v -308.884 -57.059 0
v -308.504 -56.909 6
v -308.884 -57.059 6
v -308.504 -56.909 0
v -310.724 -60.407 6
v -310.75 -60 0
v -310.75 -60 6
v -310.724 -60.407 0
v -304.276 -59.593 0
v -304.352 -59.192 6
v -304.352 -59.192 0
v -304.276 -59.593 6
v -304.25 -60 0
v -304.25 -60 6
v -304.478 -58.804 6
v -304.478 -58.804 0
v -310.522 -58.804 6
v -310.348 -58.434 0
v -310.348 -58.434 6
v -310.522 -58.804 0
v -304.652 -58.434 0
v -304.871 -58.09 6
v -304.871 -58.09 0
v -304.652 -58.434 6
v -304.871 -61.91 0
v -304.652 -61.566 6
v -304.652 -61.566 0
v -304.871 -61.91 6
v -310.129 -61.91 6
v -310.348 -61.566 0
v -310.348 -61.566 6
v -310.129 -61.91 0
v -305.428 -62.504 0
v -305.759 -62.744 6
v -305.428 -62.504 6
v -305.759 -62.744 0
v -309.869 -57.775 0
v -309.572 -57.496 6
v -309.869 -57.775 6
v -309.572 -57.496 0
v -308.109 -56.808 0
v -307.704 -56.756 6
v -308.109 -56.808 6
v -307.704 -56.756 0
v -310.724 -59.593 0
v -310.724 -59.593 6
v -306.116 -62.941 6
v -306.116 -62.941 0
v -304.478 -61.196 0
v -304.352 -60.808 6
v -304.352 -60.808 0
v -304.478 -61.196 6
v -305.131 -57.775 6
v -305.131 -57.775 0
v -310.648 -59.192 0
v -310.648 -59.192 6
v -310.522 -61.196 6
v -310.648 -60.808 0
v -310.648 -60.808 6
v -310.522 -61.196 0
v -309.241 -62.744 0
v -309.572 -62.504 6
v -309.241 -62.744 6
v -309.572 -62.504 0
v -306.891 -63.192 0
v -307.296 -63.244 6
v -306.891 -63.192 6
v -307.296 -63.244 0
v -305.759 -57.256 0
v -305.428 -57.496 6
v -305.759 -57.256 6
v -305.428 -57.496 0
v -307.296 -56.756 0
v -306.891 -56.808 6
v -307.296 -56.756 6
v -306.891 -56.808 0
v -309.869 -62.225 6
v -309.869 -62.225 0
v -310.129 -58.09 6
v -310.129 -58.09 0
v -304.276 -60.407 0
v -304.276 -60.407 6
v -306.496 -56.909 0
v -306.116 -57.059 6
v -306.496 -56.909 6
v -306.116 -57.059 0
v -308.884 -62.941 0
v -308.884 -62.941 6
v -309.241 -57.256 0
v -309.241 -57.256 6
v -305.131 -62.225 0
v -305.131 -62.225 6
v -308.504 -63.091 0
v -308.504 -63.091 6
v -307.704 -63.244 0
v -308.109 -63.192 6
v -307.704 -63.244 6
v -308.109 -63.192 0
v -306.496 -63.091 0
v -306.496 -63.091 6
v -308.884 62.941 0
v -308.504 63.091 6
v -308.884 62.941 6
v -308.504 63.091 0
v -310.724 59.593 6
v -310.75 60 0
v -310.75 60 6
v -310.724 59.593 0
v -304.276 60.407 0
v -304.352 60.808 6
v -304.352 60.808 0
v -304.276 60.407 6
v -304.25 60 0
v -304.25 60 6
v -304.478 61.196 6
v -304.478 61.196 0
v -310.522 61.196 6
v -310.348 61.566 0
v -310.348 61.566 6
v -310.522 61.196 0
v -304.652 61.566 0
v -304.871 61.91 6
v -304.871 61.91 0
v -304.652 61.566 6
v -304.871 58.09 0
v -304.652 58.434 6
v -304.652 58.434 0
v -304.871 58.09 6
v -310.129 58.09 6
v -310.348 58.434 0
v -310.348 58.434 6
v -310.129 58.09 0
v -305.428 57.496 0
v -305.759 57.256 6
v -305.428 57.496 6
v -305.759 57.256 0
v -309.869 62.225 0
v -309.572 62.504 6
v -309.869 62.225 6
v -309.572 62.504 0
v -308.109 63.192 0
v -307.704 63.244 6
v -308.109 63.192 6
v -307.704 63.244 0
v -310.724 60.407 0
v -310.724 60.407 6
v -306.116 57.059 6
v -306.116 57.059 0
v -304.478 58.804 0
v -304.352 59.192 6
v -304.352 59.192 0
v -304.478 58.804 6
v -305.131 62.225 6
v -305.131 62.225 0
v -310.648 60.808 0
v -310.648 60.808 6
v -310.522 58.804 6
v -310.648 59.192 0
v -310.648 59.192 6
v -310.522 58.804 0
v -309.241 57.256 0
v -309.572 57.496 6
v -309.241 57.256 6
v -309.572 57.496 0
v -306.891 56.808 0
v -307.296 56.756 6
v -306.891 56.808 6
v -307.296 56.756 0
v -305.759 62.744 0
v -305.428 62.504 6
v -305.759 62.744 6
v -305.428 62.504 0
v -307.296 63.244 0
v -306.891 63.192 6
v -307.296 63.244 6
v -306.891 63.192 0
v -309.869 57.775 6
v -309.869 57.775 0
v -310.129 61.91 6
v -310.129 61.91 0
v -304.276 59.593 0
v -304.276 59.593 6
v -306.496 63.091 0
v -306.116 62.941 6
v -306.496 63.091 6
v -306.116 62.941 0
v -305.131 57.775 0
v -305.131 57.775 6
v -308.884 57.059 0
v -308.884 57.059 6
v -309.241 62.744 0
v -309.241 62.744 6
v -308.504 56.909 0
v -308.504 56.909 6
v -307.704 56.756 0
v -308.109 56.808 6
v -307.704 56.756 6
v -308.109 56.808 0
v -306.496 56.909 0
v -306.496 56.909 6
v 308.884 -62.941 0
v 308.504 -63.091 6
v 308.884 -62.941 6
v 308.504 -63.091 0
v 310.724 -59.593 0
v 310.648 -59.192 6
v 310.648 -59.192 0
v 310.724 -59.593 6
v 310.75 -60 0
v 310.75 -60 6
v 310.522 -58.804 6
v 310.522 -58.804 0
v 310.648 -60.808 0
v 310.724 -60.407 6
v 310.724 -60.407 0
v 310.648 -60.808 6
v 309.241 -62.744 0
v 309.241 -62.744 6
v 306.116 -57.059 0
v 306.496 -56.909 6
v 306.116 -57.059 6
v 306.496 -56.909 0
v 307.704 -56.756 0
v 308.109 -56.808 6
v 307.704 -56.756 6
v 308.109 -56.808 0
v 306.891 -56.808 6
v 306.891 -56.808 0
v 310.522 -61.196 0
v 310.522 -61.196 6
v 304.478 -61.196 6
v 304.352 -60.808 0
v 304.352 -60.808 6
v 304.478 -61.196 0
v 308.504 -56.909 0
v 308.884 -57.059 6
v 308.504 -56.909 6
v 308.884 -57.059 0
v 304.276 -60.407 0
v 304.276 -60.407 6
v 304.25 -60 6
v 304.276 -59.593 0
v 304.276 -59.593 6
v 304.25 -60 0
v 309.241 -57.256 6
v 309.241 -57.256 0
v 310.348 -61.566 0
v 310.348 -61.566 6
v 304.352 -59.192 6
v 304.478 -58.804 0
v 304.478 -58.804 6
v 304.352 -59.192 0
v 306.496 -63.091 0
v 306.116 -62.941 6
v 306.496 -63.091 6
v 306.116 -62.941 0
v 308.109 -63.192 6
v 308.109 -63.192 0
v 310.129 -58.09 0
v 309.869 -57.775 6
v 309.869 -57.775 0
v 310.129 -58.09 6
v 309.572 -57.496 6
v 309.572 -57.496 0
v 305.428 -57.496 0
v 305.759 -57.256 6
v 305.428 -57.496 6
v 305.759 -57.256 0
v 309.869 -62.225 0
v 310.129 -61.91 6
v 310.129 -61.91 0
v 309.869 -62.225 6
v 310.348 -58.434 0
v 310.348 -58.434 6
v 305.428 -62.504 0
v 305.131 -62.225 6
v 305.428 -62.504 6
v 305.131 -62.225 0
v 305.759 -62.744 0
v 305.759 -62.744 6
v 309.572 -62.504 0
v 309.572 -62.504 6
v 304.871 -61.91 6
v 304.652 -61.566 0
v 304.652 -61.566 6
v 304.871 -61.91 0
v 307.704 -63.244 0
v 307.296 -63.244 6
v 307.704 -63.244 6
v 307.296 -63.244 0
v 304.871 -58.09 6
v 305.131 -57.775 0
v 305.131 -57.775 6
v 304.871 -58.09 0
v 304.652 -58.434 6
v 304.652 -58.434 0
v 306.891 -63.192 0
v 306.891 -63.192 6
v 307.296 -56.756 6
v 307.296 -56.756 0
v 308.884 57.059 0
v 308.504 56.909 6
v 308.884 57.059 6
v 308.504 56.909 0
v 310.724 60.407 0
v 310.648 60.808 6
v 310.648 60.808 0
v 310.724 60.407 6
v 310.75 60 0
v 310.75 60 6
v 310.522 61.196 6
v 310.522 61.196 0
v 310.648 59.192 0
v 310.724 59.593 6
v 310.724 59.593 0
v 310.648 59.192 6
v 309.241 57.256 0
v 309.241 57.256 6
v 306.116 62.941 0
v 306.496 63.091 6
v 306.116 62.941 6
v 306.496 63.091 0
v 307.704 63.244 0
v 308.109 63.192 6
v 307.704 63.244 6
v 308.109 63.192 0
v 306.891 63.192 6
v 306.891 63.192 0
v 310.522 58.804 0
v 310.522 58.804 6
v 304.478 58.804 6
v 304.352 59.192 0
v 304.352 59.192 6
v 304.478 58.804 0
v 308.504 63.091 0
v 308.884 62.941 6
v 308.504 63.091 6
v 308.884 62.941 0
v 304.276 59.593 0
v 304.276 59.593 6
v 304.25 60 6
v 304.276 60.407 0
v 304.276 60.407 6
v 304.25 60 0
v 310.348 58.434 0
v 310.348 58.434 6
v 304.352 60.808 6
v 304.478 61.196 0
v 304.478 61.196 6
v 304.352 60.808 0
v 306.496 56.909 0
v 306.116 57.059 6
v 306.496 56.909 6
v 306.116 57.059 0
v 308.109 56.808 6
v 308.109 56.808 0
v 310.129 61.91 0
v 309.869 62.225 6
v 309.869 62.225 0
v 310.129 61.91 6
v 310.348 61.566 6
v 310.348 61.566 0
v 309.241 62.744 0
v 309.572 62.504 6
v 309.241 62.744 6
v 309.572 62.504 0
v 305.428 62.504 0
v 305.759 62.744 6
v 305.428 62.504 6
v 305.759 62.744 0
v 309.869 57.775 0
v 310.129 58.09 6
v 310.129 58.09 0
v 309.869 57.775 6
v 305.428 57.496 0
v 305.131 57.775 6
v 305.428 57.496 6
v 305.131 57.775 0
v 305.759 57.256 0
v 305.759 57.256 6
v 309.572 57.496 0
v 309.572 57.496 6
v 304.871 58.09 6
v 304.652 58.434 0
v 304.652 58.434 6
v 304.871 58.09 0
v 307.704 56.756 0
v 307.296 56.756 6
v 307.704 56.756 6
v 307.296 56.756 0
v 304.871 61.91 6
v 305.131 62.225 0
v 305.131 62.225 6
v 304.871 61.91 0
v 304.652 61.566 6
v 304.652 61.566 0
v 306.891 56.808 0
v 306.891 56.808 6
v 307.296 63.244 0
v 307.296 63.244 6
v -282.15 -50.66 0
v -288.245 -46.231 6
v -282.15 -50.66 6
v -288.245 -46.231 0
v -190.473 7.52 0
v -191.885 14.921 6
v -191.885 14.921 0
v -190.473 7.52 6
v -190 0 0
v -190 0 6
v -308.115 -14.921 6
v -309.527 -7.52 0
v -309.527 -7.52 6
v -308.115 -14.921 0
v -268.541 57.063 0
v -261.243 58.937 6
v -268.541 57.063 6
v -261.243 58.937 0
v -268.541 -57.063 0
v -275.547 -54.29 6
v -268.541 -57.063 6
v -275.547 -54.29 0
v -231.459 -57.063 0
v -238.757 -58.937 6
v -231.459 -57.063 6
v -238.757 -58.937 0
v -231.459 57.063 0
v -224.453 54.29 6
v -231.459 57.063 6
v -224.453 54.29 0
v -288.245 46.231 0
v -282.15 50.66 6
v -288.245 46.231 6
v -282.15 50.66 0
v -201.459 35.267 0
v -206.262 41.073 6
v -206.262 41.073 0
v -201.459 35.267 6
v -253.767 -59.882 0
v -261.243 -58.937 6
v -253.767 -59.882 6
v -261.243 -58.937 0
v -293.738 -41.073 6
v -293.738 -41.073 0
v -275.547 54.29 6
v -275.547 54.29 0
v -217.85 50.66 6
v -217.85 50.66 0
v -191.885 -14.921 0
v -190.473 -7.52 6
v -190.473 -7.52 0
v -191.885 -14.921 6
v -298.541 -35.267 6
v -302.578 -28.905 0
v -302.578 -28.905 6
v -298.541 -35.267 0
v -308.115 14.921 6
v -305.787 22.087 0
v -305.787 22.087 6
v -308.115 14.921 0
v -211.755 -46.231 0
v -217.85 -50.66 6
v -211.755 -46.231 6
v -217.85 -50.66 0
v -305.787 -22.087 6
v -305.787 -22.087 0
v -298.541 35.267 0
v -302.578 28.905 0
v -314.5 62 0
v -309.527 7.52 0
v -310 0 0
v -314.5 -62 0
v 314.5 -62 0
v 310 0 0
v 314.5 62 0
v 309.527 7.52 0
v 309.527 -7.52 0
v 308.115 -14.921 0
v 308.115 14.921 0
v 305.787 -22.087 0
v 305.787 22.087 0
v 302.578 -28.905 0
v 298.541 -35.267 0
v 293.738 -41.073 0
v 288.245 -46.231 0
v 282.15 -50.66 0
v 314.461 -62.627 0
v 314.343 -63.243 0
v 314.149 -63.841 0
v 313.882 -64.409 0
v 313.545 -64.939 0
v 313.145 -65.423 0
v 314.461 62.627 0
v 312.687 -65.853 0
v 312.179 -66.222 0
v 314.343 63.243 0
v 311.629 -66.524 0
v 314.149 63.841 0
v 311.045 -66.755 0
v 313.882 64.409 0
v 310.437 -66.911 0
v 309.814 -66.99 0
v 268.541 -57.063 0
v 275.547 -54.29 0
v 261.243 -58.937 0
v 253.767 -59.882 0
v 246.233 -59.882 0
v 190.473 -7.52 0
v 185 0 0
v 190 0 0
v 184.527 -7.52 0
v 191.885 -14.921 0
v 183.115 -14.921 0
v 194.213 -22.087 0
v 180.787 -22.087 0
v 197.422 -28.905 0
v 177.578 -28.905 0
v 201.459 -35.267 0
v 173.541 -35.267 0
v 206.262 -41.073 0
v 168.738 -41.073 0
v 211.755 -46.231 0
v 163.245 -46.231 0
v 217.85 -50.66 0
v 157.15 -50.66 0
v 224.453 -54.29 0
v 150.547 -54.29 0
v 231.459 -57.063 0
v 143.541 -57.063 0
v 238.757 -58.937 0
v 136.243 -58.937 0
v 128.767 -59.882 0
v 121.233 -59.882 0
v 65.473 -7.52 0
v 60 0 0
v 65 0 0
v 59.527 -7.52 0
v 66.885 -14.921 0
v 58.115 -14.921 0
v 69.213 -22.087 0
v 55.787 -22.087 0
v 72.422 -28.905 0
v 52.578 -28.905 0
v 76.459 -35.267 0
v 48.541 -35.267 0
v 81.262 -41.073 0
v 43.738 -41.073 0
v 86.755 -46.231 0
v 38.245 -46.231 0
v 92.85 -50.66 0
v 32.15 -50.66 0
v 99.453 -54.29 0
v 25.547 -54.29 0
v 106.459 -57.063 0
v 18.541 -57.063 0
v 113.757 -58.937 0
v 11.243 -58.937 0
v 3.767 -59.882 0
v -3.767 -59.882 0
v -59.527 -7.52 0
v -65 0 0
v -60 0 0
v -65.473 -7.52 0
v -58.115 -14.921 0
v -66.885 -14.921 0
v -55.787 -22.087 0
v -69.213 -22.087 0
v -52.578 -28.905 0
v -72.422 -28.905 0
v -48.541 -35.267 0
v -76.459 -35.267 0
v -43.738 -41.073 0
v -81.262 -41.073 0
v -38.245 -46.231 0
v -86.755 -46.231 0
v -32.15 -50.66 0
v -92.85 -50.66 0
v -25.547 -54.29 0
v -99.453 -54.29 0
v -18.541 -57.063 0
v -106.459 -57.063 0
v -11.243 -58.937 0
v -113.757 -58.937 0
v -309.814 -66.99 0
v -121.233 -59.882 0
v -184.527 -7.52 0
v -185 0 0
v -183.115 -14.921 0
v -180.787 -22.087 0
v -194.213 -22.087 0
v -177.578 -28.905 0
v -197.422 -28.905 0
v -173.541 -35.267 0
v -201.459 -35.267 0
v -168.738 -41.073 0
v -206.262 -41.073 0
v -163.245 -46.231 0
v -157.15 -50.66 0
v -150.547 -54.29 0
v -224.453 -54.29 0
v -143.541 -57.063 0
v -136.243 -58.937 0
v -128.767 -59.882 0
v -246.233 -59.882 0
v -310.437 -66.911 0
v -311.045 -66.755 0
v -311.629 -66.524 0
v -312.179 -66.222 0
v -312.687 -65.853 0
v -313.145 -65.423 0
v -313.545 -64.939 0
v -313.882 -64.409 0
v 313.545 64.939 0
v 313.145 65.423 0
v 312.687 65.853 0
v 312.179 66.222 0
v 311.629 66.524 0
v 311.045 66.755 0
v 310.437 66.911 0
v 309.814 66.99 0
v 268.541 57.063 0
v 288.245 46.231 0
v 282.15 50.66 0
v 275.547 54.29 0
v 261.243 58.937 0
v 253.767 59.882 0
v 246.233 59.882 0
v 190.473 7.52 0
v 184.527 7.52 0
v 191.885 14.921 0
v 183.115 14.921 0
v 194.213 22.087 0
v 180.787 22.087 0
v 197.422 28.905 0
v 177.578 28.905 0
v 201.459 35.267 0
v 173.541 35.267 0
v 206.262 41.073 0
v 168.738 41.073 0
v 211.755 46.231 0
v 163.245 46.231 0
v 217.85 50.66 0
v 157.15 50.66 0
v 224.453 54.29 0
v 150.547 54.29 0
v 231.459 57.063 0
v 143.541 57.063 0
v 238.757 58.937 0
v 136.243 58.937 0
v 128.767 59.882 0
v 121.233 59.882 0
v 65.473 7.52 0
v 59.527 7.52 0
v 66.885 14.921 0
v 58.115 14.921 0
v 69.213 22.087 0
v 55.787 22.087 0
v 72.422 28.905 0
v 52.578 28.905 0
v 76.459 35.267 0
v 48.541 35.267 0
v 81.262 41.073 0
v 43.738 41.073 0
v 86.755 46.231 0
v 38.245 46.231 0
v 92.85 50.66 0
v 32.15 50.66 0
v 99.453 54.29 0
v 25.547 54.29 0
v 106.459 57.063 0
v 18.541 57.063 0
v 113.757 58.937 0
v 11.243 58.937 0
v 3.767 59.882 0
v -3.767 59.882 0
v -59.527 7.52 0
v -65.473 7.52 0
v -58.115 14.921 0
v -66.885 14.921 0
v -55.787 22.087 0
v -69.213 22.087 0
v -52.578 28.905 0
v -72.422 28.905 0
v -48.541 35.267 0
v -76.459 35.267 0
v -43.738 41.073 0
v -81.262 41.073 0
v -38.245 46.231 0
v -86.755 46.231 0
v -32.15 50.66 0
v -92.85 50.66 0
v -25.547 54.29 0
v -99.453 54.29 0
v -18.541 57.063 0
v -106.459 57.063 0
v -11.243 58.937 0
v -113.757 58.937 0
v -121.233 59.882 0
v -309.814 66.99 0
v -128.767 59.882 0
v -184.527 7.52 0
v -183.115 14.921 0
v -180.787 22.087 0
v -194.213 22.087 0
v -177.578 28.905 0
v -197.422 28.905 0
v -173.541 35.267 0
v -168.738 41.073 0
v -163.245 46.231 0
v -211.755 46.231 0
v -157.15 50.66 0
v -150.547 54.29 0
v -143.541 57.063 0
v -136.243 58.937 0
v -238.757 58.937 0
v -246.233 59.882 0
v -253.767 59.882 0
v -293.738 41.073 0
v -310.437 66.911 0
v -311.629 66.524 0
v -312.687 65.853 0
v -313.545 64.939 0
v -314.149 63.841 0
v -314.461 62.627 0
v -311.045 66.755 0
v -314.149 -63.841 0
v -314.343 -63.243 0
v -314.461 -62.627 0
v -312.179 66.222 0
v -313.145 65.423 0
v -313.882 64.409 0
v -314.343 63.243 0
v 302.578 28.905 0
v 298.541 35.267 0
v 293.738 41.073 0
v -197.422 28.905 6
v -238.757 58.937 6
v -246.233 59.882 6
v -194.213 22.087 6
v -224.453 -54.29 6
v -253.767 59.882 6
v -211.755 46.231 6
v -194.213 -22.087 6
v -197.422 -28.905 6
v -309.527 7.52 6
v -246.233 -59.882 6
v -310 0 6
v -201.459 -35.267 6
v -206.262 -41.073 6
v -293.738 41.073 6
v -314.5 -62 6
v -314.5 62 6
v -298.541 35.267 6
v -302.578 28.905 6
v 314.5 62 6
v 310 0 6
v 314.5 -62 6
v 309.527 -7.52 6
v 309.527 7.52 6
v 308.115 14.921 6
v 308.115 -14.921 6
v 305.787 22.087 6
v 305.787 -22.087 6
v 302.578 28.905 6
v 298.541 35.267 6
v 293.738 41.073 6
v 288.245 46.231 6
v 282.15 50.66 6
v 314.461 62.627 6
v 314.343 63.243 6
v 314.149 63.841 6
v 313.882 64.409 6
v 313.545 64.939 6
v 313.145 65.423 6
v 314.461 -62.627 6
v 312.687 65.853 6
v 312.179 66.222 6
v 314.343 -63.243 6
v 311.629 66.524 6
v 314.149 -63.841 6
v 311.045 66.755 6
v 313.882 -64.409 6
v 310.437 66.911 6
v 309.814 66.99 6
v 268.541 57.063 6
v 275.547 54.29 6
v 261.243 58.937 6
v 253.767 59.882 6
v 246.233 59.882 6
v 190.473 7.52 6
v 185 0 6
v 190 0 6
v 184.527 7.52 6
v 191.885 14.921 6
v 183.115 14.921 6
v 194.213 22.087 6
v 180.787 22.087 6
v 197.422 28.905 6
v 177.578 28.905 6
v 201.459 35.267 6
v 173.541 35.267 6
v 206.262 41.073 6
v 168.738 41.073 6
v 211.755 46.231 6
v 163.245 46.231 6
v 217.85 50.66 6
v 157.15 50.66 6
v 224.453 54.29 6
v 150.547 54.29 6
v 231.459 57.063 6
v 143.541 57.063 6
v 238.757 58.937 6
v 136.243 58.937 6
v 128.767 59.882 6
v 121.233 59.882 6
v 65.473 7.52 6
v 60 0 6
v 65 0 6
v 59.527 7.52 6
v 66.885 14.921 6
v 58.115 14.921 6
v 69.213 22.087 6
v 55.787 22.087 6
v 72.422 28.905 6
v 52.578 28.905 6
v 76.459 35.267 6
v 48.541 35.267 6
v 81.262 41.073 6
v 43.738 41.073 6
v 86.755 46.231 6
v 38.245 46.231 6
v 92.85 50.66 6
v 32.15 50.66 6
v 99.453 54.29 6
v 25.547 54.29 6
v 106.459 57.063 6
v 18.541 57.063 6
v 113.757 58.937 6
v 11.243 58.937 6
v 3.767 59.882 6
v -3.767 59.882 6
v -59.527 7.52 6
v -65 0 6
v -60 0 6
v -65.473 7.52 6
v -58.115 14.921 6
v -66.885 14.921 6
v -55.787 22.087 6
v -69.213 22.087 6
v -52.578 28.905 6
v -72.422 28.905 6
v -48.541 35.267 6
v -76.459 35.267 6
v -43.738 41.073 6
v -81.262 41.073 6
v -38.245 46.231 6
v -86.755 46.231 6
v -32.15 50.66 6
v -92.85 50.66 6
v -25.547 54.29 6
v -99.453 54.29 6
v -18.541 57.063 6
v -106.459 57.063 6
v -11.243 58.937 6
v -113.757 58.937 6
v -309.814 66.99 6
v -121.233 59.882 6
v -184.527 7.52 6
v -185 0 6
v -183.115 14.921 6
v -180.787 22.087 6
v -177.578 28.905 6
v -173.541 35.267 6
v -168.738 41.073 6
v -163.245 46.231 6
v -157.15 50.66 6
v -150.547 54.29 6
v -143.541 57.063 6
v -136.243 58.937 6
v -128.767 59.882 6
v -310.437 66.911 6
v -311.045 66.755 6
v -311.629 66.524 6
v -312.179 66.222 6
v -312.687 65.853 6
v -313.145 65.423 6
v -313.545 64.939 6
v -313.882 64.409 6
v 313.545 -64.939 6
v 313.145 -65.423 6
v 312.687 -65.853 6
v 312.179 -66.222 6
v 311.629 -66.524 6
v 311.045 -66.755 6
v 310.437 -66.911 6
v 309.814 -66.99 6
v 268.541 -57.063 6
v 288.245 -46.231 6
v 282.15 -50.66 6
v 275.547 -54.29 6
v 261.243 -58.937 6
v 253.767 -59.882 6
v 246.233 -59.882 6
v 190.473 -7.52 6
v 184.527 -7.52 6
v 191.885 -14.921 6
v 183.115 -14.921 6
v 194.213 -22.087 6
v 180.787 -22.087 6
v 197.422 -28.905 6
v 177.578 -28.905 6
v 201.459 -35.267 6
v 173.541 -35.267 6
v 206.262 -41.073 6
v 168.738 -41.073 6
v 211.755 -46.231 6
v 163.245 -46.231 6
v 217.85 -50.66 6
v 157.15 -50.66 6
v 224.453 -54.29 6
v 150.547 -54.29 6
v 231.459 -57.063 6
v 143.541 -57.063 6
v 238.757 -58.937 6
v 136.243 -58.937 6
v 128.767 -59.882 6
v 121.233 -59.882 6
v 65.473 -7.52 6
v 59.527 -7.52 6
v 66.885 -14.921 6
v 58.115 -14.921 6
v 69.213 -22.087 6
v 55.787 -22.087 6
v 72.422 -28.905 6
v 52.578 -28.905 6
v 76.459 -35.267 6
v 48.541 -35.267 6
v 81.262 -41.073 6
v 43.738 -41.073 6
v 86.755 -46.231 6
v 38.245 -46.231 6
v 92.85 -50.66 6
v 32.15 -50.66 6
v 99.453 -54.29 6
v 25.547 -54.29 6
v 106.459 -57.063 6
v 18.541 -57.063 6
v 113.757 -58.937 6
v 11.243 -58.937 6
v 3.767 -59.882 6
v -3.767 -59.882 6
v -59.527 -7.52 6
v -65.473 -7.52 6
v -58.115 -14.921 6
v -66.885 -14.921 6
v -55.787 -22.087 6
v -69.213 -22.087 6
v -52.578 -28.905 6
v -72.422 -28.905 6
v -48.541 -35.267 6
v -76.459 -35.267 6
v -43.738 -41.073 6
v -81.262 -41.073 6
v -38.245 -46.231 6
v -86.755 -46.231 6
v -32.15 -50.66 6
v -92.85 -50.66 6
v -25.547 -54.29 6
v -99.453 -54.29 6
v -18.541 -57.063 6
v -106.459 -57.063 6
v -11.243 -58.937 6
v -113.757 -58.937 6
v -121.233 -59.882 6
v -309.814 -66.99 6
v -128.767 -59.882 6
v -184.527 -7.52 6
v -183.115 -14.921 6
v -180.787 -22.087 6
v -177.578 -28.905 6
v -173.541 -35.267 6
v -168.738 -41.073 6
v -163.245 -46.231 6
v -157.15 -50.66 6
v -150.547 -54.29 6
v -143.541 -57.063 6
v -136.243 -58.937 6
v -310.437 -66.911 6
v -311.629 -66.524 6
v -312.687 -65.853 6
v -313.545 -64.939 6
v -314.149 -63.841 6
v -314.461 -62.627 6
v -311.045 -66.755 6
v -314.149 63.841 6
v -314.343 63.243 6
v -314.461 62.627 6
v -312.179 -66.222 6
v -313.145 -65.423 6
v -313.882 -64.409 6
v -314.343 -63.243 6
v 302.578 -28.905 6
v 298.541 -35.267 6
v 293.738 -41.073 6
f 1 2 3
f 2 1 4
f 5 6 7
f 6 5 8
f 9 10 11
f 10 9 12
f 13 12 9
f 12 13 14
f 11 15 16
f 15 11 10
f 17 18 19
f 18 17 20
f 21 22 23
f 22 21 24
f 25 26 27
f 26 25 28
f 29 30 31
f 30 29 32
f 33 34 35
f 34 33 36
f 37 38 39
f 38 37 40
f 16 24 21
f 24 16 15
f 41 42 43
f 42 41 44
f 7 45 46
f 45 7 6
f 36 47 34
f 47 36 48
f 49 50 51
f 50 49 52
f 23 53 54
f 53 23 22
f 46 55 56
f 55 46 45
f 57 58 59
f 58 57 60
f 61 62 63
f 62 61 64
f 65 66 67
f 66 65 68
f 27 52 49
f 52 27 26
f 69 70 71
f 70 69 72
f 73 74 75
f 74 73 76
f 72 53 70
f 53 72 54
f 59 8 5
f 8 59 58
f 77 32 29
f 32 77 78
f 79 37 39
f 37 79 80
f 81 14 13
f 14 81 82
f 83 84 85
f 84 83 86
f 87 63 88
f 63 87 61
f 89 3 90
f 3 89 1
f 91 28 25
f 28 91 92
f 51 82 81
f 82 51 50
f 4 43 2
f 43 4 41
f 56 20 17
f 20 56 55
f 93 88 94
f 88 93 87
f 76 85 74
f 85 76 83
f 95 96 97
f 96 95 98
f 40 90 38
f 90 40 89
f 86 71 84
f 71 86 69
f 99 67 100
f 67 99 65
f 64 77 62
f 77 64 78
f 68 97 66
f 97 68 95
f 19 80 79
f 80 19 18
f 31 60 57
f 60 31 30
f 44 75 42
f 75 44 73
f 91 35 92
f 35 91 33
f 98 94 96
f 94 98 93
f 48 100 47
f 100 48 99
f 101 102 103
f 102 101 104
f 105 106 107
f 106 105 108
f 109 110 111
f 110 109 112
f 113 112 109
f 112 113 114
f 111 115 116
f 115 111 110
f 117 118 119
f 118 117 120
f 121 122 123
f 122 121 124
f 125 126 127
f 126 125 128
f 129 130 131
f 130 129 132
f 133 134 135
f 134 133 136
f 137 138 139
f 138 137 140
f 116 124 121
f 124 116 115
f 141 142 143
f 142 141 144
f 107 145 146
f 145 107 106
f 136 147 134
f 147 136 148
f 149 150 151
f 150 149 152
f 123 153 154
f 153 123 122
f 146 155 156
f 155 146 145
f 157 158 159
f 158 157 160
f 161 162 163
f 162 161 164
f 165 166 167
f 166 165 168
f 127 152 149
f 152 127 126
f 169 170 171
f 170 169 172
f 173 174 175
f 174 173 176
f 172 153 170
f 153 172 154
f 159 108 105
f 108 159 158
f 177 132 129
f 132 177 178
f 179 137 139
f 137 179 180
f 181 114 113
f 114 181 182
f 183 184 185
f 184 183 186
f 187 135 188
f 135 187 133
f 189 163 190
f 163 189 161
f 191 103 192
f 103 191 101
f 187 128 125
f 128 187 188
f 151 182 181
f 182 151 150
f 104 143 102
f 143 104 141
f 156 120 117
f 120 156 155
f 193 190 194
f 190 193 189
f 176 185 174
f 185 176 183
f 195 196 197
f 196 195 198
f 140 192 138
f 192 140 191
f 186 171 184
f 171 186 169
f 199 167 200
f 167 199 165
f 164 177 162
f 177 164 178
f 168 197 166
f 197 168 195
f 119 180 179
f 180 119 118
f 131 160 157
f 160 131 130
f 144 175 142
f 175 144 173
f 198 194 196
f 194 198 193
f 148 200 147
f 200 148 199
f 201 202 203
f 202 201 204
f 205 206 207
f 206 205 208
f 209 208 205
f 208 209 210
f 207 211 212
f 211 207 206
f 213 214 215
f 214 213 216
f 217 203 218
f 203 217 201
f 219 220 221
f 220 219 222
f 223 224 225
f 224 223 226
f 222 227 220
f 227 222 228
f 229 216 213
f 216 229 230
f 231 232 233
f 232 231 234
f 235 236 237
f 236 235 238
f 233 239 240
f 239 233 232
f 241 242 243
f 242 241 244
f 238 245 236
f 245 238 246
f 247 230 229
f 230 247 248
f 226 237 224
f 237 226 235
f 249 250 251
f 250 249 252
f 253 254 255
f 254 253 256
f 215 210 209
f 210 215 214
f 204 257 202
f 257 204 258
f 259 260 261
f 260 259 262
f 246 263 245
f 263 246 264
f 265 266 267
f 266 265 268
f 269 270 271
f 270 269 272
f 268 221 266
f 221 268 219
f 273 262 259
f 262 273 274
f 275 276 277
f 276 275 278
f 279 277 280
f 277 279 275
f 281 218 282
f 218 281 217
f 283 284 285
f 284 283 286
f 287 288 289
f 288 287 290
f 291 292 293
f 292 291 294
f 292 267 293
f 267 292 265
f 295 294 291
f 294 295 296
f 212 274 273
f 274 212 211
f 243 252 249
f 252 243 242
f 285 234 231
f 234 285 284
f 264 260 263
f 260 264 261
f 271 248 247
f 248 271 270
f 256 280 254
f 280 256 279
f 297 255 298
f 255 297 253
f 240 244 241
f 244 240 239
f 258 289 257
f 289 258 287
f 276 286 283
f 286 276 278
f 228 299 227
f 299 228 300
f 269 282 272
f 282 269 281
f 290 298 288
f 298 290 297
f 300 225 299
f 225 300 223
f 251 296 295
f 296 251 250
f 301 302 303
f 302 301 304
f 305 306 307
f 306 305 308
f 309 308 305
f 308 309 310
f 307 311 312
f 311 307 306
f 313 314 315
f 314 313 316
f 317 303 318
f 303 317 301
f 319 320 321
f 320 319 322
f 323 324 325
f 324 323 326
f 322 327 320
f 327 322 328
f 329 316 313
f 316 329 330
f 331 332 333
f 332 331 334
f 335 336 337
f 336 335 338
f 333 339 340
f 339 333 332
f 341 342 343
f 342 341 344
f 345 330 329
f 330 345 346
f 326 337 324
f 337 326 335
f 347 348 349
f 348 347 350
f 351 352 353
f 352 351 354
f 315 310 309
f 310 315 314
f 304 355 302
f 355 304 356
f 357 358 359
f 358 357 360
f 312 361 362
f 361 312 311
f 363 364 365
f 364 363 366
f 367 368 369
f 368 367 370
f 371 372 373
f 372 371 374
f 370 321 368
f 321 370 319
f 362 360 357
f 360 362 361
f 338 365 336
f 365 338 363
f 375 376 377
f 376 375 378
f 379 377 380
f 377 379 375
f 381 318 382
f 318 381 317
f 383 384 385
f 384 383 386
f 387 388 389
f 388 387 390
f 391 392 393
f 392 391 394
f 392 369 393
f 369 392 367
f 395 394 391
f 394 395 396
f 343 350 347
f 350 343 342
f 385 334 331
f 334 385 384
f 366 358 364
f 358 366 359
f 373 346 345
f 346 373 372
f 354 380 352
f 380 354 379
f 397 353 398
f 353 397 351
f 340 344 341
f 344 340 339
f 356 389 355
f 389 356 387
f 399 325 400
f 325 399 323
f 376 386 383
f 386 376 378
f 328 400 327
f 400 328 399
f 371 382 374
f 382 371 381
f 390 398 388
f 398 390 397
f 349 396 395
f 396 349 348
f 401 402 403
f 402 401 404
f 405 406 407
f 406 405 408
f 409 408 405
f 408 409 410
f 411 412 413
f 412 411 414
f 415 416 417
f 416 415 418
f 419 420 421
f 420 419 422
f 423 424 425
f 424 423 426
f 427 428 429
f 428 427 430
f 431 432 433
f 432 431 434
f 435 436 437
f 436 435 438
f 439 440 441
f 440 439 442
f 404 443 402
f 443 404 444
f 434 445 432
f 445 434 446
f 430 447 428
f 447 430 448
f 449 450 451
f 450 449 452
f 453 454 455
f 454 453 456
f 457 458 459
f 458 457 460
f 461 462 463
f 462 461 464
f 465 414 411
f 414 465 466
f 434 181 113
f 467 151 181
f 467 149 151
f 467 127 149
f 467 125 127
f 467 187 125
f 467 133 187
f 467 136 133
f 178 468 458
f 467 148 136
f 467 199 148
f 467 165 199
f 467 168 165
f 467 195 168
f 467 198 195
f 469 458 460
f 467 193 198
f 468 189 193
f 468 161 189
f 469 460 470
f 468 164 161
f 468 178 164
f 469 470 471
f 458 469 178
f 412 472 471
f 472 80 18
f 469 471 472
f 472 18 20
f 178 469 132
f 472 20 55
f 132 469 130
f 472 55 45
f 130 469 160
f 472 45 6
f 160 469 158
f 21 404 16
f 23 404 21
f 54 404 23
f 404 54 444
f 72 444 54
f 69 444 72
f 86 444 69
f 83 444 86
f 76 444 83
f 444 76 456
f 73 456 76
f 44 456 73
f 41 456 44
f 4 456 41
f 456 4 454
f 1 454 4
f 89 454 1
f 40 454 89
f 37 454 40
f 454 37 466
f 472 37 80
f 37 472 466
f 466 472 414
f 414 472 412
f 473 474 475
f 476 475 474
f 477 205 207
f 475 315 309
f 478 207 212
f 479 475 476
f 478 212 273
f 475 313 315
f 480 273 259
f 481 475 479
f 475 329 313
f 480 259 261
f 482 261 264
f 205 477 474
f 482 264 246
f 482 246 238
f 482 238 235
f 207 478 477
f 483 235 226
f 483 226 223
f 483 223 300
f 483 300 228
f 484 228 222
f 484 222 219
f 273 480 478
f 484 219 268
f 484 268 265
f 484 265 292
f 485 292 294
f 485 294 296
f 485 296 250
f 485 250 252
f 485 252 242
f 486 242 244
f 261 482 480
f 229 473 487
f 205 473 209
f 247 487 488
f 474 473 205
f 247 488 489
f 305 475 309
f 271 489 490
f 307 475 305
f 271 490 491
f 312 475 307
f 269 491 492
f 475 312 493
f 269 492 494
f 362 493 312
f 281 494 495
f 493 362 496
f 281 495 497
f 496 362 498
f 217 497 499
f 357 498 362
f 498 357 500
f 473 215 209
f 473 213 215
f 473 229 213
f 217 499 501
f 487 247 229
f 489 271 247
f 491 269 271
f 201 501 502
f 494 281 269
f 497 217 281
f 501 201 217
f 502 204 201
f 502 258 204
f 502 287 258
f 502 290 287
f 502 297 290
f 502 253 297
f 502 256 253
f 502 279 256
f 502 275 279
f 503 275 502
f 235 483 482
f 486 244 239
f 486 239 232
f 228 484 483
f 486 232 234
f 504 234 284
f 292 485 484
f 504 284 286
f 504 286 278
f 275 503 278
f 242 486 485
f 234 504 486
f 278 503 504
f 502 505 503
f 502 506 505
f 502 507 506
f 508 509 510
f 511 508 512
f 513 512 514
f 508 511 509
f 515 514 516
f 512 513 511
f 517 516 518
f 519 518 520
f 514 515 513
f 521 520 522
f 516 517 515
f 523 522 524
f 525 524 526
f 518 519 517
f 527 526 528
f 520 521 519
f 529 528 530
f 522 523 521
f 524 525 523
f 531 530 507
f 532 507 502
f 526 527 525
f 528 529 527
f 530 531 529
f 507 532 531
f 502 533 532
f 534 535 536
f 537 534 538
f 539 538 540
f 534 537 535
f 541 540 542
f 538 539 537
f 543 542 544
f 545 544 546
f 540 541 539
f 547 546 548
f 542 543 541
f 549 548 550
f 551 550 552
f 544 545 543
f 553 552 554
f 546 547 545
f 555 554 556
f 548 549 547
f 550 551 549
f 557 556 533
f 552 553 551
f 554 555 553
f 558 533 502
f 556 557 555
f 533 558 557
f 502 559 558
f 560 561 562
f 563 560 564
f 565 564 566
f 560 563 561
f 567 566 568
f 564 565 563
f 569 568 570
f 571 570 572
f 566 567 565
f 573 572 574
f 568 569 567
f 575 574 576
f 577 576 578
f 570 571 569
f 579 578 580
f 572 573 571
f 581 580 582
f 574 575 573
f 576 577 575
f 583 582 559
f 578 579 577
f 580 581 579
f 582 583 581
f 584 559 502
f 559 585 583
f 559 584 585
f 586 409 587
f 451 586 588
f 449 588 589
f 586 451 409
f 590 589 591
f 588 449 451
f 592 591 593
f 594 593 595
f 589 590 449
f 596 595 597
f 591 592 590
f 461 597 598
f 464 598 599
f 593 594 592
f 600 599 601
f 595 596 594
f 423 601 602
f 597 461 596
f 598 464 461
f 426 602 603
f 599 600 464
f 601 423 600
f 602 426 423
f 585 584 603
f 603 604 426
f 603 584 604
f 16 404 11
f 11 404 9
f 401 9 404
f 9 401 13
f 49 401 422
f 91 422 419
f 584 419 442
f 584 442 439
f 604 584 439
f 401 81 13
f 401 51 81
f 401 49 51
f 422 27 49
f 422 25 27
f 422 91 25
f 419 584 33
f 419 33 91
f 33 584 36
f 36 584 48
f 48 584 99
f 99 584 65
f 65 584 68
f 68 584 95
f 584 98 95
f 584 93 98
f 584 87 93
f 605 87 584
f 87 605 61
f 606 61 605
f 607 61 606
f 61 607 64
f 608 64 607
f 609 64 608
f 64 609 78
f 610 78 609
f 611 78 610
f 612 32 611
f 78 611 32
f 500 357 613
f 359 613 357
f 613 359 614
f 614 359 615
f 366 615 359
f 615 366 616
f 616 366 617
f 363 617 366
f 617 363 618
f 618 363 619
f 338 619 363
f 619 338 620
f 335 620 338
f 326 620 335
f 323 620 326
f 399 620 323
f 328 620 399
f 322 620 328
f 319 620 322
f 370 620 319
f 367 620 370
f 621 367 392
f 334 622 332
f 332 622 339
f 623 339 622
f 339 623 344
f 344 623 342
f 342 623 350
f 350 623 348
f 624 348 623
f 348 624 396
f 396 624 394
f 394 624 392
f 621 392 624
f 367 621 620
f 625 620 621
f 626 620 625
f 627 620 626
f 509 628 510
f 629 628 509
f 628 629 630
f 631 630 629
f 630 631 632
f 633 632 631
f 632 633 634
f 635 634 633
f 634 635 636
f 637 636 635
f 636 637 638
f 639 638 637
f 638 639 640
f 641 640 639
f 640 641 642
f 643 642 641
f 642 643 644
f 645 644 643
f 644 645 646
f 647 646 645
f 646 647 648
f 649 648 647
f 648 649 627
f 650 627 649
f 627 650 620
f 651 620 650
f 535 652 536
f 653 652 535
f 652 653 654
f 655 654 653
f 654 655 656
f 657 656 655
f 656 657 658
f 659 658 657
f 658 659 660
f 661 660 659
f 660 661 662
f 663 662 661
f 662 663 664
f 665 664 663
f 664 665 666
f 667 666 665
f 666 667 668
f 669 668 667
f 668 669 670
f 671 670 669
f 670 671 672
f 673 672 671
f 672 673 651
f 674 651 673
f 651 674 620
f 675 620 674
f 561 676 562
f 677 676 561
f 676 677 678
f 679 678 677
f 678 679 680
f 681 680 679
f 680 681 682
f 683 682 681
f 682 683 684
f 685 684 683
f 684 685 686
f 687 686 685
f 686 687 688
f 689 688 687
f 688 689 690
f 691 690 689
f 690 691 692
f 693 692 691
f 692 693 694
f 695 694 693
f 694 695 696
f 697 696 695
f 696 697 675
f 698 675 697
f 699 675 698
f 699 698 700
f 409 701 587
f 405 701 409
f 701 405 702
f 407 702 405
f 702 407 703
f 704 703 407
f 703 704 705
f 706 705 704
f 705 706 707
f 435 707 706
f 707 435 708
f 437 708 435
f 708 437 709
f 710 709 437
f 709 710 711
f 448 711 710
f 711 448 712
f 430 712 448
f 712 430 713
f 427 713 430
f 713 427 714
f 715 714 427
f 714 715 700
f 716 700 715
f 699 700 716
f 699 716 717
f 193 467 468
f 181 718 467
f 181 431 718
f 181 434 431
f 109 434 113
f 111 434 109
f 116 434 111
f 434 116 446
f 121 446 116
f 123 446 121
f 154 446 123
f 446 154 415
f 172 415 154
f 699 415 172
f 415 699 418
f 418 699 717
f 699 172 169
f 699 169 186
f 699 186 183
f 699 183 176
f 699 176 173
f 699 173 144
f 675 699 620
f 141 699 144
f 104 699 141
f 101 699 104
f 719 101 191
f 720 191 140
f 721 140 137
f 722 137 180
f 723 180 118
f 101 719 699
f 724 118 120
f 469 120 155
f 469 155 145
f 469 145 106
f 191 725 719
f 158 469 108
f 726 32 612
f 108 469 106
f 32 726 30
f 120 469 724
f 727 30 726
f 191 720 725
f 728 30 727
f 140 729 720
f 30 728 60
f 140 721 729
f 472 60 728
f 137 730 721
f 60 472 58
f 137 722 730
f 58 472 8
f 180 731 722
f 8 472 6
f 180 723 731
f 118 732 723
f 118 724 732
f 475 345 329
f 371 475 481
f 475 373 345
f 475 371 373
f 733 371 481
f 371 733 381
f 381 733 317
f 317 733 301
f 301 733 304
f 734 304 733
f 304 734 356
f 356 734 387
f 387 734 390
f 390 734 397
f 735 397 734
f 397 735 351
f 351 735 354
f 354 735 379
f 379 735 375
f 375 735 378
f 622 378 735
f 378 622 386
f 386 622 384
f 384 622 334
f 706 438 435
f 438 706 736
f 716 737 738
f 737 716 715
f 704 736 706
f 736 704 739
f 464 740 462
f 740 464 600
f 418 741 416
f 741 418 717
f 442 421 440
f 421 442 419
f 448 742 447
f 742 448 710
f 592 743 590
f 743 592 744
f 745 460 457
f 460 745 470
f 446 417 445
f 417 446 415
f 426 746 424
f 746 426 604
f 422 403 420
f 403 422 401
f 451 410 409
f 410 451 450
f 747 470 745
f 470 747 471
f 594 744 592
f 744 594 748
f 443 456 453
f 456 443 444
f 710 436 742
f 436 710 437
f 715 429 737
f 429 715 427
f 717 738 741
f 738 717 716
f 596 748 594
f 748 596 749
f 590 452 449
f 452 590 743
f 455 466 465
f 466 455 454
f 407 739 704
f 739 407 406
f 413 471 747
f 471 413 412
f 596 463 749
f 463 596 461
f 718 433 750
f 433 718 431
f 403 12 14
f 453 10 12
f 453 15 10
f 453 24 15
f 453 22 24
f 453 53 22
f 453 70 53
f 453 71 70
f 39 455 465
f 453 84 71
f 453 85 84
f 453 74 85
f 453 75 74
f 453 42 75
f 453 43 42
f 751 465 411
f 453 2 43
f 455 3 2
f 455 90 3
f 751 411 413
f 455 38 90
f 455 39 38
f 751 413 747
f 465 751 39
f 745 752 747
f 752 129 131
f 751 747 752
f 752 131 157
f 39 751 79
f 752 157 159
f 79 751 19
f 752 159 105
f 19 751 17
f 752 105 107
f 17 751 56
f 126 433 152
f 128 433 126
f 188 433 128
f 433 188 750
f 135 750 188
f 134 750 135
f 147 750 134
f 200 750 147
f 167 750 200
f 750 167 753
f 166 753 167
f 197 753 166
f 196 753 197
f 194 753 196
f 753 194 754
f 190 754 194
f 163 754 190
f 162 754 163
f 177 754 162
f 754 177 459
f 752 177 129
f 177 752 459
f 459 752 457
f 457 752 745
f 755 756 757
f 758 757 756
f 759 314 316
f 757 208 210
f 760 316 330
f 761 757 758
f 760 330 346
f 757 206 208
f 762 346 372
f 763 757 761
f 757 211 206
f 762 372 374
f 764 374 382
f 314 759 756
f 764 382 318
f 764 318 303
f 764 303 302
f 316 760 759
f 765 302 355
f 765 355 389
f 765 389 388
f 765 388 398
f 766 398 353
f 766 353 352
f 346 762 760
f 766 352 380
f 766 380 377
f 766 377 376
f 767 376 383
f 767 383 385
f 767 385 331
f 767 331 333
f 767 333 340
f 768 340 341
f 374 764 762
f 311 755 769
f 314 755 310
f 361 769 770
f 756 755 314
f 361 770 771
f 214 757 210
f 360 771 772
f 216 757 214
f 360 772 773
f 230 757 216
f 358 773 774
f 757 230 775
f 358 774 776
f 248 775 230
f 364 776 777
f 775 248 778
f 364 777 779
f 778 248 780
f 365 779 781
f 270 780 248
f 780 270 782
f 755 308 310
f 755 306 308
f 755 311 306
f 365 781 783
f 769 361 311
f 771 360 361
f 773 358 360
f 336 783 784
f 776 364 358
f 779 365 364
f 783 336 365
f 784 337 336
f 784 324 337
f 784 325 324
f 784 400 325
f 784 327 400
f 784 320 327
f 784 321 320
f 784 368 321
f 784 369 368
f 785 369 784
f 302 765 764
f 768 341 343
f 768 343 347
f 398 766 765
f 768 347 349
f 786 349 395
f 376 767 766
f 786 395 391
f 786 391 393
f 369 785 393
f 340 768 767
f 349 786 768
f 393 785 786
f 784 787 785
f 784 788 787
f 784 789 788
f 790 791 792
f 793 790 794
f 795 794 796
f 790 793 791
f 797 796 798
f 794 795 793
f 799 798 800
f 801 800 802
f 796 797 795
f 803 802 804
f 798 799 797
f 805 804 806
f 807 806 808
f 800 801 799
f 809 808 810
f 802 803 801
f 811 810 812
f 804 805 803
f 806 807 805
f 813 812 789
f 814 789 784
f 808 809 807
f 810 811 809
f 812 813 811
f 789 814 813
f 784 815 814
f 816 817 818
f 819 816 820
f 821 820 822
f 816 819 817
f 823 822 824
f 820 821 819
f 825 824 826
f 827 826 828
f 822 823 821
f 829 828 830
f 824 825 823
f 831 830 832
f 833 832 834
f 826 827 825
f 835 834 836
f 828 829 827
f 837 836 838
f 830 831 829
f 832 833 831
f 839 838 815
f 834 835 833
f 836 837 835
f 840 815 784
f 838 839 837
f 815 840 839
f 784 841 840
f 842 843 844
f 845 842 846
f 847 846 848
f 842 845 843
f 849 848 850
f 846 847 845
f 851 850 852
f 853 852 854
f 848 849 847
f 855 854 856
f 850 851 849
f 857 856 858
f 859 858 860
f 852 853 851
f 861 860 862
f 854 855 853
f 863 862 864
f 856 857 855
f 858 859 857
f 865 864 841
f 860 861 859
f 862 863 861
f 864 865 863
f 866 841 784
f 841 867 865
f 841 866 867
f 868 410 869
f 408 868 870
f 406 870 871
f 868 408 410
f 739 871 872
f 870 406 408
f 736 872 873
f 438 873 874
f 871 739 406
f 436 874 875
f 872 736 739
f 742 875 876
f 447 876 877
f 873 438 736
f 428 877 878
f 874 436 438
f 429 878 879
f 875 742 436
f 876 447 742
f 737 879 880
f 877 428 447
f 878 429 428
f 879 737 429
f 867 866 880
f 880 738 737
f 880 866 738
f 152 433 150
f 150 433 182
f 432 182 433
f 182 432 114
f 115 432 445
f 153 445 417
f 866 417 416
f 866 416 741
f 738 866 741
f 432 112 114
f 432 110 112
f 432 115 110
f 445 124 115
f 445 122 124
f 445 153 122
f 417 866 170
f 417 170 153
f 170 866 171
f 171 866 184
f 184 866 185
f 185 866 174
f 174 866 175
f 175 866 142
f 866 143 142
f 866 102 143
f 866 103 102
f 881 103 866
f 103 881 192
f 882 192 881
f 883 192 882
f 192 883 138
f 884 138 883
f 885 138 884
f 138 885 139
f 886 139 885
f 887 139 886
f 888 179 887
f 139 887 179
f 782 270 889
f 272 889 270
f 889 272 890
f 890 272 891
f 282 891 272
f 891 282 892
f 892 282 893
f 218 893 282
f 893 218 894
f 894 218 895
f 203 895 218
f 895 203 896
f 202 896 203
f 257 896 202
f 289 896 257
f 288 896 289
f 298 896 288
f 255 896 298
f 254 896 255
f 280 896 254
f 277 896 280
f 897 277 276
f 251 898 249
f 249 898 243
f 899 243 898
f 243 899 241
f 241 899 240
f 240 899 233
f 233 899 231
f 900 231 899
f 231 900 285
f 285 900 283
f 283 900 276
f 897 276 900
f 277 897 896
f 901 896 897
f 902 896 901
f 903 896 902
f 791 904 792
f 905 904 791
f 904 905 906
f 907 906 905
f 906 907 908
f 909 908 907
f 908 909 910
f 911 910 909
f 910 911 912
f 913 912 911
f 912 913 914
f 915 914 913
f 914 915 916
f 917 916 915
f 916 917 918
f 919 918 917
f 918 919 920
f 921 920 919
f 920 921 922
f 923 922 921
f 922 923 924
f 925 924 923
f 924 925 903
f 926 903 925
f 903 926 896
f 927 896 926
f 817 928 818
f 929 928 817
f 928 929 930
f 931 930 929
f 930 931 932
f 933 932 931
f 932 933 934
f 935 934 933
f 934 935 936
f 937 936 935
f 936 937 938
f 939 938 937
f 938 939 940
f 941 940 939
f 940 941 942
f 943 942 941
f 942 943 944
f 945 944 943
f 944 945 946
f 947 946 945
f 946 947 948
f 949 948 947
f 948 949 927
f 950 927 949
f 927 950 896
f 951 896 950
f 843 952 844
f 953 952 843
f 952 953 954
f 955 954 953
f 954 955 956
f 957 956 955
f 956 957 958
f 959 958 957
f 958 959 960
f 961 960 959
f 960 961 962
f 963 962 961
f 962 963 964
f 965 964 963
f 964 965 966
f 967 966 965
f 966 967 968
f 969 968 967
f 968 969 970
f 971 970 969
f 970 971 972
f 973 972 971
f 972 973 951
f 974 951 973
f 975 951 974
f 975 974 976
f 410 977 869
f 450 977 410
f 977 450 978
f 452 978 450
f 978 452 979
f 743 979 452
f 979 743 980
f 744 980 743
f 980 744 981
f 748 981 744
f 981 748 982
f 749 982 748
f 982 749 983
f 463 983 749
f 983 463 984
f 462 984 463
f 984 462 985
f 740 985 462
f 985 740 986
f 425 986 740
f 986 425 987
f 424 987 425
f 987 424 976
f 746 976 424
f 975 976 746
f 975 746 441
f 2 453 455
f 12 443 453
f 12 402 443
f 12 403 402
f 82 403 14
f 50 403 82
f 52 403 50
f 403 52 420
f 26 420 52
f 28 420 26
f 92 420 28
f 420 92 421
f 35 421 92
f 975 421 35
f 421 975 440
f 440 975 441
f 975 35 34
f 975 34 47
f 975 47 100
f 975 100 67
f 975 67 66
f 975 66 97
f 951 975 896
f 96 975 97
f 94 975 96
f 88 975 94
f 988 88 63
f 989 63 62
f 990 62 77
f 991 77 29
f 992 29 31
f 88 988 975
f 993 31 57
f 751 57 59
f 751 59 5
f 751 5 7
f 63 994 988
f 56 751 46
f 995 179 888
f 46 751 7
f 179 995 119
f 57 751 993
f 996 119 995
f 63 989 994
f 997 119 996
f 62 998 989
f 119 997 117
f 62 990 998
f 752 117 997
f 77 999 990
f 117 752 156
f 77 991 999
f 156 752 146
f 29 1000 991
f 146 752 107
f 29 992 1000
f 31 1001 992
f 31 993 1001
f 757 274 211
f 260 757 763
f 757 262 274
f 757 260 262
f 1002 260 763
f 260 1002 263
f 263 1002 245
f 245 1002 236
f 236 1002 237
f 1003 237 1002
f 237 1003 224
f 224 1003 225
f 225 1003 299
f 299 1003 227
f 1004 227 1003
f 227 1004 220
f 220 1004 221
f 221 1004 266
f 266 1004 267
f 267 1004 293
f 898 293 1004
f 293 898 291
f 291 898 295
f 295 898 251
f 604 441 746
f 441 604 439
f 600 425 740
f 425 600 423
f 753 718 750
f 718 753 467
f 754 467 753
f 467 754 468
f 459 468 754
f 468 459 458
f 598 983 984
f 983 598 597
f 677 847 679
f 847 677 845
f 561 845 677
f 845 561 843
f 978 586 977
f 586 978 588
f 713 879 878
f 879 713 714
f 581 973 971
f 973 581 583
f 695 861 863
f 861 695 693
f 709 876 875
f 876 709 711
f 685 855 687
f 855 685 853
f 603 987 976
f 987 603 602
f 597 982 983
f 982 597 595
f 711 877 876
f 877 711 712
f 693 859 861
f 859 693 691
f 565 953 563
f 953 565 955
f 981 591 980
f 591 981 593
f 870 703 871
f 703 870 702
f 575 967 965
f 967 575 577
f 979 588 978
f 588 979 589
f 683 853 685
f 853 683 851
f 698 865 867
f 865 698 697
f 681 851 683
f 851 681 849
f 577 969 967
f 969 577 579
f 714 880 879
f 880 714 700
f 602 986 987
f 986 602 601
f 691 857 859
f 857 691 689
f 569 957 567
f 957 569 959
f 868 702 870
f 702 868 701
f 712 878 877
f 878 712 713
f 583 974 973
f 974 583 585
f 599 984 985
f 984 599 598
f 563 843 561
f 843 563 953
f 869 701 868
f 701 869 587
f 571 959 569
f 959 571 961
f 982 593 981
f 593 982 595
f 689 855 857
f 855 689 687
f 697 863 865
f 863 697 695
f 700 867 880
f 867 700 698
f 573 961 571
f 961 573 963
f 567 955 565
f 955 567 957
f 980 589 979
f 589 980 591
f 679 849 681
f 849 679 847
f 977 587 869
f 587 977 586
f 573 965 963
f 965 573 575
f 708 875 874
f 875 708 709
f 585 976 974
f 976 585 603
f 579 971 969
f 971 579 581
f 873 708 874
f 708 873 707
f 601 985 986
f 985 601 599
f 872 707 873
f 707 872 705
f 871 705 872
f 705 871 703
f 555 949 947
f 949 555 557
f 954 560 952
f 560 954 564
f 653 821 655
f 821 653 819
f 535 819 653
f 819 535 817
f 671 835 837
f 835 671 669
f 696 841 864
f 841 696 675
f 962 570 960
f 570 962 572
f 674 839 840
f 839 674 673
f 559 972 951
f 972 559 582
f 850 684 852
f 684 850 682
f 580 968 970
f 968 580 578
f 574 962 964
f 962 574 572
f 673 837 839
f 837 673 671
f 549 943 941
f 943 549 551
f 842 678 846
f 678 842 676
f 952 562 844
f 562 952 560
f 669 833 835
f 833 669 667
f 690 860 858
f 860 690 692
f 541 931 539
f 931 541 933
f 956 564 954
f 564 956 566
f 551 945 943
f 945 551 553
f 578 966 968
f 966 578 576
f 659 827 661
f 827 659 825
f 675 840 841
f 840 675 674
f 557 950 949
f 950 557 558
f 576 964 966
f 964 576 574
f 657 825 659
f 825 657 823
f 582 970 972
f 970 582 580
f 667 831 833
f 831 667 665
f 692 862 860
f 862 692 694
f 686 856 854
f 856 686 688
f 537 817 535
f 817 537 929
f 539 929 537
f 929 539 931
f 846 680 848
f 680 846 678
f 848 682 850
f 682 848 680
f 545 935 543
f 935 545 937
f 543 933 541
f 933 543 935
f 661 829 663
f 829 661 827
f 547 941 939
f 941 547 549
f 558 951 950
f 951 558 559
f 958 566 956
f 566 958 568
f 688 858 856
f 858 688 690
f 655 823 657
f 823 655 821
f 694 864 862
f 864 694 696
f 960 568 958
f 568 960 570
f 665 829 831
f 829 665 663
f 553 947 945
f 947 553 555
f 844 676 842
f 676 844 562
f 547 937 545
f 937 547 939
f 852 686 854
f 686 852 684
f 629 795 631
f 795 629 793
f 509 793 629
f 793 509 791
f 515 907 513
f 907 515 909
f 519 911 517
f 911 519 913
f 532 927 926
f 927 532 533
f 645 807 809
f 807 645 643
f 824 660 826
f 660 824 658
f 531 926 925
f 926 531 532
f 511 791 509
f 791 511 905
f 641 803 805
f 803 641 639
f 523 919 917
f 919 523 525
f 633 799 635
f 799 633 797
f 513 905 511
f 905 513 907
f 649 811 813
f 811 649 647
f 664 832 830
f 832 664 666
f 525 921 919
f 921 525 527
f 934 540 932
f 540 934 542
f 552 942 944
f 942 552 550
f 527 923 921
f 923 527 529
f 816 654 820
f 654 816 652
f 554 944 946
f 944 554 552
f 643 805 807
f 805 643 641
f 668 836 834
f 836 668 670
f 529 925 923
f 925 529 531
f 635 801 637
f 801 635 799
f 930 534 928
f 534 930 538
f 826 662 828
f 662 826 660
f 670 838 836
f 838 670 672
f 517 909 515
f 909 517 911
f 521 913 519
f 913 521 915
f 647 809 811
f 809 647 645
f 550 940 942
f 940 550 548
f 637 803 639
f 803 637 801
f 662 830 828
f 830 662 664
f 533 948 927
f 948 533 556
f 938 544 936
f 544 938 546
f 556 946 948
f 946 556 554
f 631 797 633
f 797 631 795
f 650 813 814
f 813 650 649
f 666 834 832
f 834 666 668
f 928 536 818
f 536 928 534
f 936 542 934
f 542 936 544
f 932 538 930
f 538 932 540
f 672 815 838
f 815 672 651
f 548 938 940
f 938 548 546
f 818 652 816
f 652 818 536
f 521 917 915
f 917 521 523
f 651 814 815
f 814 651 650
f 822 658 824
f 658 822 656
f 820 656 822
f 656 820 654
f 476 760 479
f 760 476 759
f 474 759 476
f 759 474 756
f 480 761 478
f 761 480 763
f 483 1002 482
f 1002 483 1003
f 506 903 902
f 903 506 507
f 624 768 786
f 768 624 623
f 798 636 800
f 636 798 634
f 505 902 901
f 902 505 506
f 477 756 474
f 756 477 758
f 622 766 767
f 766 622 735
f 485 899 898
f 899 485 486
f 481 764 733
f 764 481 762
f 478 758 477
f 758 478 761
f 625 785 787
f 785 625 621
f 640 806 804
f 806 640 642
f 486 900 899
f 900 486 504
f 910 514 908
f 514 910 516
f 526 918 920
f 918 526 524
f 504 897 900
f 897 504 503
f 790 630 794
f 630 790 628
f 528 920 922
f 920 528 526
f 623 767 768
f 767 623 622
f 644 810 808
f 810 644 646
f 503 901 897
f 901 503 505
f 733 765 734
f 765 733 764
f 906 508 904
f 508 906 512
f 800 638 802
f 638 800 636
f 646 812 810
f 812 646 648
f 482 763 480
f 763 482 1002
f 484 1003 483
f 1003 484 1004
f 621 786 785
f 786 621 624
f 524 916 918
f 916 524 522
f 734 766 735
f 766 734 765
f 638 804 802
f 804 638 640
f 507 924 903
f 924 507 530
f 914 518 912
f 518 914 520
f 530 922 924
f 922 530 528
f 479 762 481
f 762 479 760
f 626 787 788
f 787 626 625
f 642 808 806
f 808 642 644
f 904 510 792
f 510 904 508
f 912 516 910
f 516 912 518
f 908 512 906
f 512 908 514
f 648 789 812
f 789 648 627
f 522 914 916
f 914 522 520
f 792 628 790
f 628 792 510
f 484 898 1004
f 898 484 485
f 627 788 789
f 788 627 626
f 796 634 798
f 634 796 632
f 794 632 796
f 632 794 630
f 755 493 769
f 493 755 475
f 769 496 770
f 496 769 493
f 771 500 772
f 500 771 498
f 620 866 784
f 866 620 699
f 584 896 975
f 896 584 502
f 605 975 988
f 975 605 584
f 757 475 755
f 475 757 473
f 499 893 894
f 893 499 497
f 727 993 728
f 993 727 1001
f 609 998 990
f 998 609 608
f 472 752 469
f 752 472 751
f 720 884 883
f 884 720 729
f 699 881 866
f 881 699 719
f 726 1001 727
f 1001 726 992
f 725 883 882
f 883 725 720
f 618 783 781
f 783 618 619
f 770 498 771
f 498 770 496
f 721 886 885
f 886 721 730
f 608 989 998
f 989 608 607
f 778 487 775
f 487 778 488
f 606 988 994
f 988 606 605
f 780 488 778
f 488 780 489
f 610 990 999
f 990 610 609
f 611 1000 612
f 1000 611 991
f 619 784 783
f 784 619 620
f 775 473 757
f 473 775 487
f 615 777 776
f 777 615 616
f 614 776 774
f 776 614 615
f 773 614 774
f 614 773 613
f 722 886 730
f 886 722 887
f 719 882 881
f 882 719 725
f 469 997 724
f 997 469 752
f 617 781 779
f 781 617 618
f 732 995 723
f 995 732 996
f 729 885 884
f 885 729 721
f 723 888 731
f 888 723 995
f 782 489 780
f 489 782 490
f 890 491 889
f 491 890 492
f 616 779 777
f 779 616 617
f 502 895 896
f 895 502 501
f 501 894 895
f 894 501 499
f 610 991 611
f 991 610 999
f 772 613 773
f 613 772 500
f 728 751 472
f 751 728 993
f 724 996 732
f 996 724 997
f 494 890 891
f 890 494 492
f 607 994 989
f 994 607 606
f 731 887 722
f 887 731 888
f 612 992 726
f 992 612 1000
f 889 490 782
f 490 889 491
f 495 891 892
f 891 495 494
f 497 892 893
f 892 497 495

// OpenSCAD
$fn = 50;


difference() {
	union() {
		hull() {
			translate(v = [-309.5000000000, 62.0000000000, 0]) {
				cylinder(h = 6, r = 5);
			}
			translate(v = [309.5000000000, 62.0000000000, 0]) {
				cylinder(h = 6, r = 5);
			}
			translate(v = [-309.5000000000, -62.0000000000, 0]) {
				cylinder(h = 6, r = 5);
			}
			translate(v = [309.5000000000, -62.0000000000, 0]) {
				cylinder(h = 6, r = 5);
			}
		}
	}
	union() {
		#translate(v = [-307.5000000000, -60.0000000000, -100.0000000000]) {
			cylinder(h = 200, r = 3.2500000000);
		}
		#translate(v = [-307.5000000000, 60.0000000000, -100.0000000000]) {
			cylinder(h = 200, r = 3.2500000000);
		}
		#translate(v = [307.5000000000, -60.0000000000, -100.0000000000]) {
			cylinder(h = 200, r = 3.2500000000);
		}
		#translate(v = [307.5000000000, 60.0000000000, -100.0000000000]) {
			cylinder(h = 200, r = 3.2500000000);
		}
		#translate(v = [-250.0000000000, 0, 0]) {
			cylinder(h = 6, r = 60.0000000000);
		}
		#translate(v = [-125.0000000000, 0, 0]) {
			cylinder(h = 6, r = 60.0000000000);
		}
		#cylinder(h = 6, r = 60.0000000000);
		#translate(v = [125.0000000000, 0, 0]) {
			cylinder(h = 6, r = 60.0000000000);
		}
		#translate(v = [250.0000000000, 0, 0]) {
			cylinder(h = 6, r = 60.0000000000);
		}
	}
}
